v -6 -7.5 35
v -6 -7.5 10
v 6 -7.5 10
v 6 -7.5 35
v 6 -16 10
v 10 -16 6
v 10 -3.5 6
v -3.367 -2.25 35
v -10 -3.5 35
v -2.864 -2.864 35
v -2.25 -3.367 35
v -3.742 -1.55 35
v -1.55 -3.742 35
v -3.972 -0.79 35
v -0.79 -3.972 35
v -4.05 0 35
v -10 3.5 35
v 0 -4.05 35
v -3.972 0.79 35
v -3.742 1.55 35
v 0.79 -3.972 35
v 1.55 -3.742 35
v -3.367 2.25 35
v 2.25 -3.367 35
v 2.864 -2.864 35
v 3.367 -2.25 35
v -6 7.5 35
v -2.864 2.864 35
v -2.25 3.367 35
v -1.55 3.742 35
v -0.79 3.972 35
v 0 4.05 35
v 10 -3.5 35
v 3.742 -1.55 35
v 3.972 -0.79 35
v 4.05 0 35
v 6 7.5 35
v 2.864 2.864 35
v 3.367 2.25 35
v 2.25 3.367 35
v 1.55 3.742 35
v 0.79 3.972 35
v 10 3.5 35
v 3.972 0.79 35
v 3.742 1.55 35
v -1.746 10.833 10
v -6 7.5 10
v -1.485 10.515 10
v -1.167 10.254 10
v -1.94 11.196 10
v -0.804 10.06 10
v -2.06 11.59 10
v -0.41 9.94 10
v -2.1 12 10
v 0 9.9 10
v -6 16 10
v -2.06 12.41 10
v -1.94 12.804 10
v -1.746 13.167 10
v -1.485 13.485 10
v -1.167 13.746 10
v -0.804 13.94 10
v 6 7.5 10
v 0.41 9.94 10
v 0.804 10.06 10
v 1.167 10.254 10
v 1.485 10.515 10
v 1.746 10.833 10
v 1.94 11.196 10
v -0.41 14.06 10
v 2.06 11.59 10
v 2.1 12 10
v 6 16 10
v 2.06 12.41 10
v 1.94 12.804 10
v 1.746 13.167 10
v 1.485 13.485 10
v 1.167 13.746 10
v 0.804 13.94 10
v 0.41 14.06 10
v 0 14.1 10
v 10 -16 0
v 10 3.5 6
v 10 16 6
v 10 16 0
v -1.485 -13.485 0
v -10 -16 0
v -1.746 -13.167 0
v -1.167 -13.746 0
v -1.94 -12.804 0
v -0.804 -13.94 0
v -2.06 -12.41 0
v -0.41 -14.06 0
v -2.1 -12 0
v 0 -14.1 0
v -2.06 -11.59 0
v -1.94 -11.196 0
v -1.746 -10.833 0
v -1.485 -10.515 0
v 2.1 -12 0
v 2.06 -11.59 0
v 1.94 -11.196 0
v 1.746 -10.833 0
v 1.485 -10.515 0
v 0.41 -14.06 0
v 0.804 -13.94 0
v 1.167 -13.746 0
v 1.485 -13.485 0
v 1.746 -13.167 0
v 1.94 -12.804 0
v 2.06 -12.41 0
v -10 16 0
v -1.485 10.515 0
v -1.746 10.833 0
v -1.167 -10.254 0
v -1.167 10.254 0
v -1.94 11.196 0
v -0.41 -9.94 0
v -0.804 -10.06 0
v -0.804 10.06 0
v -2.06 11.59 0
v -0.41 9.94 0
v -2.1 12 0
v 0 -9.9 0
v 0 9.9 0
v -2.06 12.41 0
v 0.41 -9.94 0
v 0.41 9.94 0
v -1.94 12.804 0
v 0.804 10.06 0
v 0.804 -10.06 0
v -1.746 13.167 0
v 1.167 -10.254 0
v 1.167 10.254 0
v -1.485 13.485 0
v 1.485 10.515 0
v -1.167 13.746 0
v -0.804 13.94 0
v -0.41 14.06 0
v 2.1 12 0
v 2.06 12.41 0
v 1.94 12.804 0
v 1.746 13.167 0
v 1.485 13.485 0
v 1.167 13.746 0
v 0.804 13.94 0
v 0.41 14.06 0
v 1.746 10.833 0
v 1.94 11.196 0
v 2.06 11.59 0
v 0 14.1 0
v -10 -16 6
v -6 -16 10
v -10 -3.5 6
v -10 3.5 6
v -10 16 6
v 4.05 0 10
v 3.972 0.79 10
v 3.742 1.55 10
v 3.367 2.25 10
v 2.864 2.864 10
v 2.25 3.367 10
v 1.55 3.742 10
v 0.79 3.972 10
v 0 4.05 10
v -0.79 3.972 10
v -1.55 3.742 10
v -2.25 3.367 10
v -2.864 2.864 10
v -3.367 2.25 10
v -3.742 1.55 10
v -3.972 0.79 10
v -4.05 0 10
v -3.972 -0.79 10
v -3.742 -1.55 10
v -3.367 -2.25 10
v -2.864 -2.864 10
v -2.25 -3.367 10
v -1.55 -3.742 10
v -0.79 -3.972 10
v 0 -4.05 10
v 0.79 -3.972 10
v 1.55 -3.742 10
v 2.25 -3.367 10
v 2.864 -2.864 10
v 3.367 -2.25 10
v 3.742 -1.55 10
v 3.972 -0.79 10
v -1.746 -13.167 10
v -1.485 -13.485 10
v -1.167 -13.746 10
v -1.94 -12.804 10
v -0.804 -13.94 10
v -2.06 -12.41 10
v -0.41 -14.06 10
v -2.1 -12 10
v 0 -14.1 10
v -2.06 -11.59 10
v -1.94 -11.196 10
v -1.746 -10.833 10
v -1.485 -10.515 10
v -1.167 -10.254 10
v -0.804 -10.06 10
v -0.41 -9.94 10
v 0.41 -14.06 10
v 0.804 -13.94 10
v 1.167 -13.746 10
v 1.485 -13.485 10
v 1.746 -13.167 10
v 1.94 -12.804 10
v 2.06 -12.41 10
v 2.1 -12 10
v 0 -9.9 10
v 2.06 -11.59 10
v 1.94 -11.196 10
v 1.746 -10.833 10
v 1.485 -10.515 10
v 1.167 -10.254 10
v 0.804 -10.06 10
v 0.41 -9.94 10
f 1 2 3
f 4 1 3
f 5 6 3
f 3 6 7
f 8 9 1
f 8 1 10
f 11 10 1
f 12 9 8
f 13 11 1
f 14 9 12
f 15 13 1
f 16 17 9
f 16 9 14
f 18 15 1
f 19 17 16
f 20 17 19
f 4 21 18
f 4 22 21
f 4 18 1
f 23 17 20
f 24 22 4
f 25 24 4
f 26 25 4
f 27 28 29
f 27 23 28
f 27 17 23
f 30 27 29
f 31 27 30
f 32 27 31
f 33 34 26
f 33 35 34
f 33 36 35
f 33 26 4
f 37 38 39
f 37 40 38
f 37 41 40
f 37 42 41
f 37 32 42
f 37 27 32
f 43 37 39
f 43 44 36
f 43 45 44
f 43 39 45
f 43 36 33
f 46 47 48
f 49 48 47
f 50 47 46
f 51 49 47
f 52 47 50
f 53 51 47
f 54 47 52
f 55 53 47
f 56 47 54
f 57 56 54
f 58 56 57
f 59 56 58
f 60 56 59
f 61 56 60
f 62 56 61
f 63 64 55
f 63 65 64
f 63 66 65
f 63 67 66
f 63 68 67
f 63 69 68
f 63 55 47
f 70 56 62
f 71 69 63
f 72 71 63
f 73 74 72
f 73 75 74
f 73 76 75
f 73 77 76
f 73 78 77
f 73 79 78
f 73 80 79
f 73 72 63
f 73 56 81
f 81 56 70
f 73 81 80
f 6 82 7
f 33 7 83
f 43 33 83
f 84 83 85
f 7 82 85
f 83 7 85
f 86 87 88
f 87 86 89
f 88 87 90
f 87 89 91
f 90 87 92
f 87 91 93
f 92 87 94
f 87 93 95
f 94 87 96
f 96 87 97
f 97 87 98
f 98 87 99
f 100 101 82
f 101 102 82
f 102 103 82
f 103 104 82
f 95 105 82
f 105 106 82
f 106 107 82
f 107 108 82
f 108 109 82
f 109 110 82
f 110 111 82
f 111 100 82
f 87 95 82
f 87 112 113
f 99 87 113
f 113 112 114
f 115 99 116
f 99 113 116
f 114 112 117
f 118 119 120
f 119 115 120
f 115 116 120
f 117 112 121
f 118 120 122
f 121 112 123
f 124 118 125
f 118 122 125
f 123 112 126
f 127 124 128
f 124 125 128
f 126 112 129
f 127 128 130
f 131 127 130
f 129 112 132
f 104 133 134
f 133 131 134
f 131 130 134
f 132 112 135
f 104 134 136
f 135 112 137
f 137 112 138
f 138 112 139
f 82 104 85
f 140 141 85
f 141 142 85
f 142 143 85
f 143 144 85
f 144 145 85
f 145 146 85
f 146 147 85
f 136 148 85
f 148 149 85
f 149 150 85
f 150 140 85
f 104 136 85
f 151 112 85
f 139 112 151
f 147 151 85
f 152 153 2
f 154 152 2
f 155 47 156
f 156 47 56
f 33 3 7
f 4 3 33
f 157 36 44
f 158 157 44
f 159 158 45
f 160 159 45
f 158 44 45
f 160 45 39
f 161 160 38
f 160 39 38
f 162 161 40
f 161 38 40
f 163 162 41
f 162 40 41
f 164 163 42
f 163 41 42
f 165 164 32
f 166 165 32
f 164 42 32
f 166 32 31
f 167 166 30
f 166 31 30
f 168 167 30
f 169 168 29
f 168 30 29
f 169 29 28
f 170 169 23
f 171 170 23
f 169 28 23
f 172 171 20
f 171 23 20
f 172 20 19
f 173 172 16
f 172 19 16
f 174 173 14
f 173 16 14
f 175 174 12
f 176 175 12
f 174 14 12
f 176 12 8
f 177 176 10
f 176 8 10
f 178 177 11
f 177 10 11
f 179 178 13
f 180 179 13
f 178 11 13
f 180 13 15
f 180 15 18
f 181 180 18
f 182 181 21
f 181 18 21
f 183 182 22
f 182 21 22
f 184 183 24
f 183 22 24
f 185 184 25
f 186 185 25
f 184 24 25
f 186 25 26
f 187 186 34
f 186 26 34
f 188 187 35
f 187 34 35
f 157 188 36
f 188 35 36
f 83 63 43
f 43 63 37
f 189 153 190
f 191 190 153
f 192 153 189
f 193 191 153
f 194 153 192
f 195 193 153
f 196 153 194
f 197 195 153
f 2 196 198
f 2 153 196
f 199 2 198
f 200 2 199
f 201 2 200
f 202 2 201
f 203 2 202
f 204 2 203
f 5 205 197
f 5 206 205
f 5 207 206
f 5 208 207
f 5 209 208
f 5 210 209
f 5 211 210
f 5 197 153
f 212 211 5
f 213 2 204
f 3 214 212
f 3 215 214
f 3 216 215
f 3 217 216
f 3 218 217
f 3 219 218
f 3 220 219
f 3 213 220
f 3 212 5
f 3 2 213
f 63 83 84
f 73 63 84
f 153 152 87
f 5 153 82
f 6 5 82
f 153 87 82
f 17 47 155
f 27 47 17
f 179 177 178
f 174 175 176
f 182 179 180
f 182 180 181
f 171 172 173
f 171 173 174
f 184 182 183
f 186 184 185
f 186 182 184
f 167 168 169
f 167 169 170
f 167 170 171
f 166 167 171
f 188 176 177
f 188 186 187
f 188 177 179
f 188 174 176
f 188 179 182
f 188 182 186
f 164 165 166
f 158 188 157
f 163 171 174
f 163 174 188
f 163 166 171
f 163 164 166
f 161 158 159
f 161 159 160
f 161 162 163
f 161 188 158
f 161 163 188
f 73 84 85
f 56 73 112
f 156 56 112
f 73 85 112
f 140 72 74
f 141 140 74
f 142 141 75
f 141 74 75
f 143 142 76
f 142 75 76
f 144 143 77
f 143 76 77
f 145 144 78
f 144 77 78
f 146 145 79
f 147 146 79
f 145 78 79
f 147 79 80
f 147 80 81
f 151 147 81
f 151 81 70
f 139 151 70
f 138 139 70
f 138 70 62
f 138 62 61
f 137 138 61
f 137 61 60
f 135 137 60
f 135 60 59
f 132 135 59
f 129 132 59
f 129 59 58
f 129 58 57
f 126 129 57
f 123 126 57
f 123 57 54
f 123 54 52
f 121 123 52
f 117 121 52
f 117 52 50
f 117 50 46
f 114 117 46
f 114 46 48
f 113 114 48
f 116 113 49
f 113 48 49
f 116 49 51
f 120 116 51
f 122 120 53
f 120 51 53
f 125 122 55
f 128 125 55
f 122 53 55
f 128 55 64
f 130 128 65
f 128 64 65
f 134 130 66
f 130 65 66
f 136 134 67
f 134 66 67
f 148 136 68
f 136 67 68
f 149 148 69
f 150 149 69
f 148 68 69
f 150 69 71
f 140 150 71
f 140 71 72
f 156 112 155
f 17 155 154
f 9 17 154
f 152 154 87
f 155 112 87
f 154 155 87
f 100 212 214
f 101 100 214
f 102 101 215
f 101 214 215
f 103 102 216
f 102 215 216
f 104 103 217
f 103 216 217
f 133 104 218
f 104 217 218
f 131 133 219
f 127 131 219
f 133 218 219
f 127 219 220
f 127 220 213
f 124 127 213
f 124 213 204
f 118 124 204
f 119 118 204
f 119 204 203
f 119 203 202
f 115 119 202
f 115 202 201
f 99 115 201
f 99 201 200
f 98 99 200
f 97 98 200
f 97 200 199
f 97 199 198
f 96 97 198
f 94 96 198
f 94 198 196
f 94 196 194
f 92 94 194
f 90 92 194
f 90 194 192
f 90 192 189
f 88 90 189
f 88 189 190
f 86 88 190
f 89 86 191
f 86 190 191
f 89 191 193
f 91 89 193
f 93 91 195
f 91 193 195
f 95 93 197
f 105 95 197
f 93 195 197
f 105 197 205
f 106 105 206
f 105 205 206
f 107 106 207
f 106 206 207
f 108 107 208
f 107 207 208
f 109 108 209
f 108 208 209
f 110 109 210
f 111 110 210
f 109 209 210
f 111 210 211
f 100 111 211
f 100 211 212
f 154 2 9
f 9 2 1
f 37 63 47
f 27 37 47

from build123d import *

# Parameters (mm, degrees)
F1_DEPTH = 10
F3_DEPTH = 25
F4_SIZE  = 4
F5_R     = 2.1
F6_DEPTH = 10.001
F7_R     = 4.05
F8_DEPTH = 25
F9_SIZE  = 4


with BuildPart() as f1:
    # F0 (on Top) → F1 (new body)
    with BuildSketch(Plane.XY):
        Polygon((-10, 16), (-10, 0), (-10, -16), (0, -16), (10, -16), (10, 0), (10, 16), (0, 16), align=None)
    extrude(amount=F1_DEPTH)

    # F2 (on face) → F3 (join)
    with BuildSketch(Plane.XY.offset(10)):
        Polygon((10, 7.5), (0, 7.5), (-10, 7.5), (-10, -7.5), (0, -7.5), (10, -7.5), (10, 0), align=None)
    extrude(amount=F3_DEPTH)

    # F4
    f4_edges = [f1.edges().sort_by_distance(p)[0] for p in [
        (-10, -7.5, 22.5),
        (10, -7.5, 22.5),
        (10, 7.5, 22.5),
        (-10, 7.5, 22.5),
    ]]
    chamfer(f4_edges, length=F4_SIZE)

    # F5 (on face) → F6 (cut, through all)
    with BuildSketch(Plane.XY.offset(10)):
        with Locations((0, 12)):
            Circle(F5_R)
        with Locations((0, -12)):
            Circle(F5_R)
    extrude(amount=-F6_DEPTH, mode=Mode.SUBTRACT)

    # F7 (on face) → F8 (cut)
    with BuildSketch(Plane.XY.offset(35)):
        Circle(F7_R)
    extrude(amount=-F8_DEPTH, mode=Mode.SUBTRACT)

    # F9
    f9_edges = [f1.edges().sort_by_distance(p)[0] for p in [
        (-10, 9.75, 10),
        (-10, -9.75, 10),
        (10, -9.75, 10),
        (10, 9.75, 10),
    ]]
    chamfer(f9_edges, length=F9_SIZE)


solid = f1.part
